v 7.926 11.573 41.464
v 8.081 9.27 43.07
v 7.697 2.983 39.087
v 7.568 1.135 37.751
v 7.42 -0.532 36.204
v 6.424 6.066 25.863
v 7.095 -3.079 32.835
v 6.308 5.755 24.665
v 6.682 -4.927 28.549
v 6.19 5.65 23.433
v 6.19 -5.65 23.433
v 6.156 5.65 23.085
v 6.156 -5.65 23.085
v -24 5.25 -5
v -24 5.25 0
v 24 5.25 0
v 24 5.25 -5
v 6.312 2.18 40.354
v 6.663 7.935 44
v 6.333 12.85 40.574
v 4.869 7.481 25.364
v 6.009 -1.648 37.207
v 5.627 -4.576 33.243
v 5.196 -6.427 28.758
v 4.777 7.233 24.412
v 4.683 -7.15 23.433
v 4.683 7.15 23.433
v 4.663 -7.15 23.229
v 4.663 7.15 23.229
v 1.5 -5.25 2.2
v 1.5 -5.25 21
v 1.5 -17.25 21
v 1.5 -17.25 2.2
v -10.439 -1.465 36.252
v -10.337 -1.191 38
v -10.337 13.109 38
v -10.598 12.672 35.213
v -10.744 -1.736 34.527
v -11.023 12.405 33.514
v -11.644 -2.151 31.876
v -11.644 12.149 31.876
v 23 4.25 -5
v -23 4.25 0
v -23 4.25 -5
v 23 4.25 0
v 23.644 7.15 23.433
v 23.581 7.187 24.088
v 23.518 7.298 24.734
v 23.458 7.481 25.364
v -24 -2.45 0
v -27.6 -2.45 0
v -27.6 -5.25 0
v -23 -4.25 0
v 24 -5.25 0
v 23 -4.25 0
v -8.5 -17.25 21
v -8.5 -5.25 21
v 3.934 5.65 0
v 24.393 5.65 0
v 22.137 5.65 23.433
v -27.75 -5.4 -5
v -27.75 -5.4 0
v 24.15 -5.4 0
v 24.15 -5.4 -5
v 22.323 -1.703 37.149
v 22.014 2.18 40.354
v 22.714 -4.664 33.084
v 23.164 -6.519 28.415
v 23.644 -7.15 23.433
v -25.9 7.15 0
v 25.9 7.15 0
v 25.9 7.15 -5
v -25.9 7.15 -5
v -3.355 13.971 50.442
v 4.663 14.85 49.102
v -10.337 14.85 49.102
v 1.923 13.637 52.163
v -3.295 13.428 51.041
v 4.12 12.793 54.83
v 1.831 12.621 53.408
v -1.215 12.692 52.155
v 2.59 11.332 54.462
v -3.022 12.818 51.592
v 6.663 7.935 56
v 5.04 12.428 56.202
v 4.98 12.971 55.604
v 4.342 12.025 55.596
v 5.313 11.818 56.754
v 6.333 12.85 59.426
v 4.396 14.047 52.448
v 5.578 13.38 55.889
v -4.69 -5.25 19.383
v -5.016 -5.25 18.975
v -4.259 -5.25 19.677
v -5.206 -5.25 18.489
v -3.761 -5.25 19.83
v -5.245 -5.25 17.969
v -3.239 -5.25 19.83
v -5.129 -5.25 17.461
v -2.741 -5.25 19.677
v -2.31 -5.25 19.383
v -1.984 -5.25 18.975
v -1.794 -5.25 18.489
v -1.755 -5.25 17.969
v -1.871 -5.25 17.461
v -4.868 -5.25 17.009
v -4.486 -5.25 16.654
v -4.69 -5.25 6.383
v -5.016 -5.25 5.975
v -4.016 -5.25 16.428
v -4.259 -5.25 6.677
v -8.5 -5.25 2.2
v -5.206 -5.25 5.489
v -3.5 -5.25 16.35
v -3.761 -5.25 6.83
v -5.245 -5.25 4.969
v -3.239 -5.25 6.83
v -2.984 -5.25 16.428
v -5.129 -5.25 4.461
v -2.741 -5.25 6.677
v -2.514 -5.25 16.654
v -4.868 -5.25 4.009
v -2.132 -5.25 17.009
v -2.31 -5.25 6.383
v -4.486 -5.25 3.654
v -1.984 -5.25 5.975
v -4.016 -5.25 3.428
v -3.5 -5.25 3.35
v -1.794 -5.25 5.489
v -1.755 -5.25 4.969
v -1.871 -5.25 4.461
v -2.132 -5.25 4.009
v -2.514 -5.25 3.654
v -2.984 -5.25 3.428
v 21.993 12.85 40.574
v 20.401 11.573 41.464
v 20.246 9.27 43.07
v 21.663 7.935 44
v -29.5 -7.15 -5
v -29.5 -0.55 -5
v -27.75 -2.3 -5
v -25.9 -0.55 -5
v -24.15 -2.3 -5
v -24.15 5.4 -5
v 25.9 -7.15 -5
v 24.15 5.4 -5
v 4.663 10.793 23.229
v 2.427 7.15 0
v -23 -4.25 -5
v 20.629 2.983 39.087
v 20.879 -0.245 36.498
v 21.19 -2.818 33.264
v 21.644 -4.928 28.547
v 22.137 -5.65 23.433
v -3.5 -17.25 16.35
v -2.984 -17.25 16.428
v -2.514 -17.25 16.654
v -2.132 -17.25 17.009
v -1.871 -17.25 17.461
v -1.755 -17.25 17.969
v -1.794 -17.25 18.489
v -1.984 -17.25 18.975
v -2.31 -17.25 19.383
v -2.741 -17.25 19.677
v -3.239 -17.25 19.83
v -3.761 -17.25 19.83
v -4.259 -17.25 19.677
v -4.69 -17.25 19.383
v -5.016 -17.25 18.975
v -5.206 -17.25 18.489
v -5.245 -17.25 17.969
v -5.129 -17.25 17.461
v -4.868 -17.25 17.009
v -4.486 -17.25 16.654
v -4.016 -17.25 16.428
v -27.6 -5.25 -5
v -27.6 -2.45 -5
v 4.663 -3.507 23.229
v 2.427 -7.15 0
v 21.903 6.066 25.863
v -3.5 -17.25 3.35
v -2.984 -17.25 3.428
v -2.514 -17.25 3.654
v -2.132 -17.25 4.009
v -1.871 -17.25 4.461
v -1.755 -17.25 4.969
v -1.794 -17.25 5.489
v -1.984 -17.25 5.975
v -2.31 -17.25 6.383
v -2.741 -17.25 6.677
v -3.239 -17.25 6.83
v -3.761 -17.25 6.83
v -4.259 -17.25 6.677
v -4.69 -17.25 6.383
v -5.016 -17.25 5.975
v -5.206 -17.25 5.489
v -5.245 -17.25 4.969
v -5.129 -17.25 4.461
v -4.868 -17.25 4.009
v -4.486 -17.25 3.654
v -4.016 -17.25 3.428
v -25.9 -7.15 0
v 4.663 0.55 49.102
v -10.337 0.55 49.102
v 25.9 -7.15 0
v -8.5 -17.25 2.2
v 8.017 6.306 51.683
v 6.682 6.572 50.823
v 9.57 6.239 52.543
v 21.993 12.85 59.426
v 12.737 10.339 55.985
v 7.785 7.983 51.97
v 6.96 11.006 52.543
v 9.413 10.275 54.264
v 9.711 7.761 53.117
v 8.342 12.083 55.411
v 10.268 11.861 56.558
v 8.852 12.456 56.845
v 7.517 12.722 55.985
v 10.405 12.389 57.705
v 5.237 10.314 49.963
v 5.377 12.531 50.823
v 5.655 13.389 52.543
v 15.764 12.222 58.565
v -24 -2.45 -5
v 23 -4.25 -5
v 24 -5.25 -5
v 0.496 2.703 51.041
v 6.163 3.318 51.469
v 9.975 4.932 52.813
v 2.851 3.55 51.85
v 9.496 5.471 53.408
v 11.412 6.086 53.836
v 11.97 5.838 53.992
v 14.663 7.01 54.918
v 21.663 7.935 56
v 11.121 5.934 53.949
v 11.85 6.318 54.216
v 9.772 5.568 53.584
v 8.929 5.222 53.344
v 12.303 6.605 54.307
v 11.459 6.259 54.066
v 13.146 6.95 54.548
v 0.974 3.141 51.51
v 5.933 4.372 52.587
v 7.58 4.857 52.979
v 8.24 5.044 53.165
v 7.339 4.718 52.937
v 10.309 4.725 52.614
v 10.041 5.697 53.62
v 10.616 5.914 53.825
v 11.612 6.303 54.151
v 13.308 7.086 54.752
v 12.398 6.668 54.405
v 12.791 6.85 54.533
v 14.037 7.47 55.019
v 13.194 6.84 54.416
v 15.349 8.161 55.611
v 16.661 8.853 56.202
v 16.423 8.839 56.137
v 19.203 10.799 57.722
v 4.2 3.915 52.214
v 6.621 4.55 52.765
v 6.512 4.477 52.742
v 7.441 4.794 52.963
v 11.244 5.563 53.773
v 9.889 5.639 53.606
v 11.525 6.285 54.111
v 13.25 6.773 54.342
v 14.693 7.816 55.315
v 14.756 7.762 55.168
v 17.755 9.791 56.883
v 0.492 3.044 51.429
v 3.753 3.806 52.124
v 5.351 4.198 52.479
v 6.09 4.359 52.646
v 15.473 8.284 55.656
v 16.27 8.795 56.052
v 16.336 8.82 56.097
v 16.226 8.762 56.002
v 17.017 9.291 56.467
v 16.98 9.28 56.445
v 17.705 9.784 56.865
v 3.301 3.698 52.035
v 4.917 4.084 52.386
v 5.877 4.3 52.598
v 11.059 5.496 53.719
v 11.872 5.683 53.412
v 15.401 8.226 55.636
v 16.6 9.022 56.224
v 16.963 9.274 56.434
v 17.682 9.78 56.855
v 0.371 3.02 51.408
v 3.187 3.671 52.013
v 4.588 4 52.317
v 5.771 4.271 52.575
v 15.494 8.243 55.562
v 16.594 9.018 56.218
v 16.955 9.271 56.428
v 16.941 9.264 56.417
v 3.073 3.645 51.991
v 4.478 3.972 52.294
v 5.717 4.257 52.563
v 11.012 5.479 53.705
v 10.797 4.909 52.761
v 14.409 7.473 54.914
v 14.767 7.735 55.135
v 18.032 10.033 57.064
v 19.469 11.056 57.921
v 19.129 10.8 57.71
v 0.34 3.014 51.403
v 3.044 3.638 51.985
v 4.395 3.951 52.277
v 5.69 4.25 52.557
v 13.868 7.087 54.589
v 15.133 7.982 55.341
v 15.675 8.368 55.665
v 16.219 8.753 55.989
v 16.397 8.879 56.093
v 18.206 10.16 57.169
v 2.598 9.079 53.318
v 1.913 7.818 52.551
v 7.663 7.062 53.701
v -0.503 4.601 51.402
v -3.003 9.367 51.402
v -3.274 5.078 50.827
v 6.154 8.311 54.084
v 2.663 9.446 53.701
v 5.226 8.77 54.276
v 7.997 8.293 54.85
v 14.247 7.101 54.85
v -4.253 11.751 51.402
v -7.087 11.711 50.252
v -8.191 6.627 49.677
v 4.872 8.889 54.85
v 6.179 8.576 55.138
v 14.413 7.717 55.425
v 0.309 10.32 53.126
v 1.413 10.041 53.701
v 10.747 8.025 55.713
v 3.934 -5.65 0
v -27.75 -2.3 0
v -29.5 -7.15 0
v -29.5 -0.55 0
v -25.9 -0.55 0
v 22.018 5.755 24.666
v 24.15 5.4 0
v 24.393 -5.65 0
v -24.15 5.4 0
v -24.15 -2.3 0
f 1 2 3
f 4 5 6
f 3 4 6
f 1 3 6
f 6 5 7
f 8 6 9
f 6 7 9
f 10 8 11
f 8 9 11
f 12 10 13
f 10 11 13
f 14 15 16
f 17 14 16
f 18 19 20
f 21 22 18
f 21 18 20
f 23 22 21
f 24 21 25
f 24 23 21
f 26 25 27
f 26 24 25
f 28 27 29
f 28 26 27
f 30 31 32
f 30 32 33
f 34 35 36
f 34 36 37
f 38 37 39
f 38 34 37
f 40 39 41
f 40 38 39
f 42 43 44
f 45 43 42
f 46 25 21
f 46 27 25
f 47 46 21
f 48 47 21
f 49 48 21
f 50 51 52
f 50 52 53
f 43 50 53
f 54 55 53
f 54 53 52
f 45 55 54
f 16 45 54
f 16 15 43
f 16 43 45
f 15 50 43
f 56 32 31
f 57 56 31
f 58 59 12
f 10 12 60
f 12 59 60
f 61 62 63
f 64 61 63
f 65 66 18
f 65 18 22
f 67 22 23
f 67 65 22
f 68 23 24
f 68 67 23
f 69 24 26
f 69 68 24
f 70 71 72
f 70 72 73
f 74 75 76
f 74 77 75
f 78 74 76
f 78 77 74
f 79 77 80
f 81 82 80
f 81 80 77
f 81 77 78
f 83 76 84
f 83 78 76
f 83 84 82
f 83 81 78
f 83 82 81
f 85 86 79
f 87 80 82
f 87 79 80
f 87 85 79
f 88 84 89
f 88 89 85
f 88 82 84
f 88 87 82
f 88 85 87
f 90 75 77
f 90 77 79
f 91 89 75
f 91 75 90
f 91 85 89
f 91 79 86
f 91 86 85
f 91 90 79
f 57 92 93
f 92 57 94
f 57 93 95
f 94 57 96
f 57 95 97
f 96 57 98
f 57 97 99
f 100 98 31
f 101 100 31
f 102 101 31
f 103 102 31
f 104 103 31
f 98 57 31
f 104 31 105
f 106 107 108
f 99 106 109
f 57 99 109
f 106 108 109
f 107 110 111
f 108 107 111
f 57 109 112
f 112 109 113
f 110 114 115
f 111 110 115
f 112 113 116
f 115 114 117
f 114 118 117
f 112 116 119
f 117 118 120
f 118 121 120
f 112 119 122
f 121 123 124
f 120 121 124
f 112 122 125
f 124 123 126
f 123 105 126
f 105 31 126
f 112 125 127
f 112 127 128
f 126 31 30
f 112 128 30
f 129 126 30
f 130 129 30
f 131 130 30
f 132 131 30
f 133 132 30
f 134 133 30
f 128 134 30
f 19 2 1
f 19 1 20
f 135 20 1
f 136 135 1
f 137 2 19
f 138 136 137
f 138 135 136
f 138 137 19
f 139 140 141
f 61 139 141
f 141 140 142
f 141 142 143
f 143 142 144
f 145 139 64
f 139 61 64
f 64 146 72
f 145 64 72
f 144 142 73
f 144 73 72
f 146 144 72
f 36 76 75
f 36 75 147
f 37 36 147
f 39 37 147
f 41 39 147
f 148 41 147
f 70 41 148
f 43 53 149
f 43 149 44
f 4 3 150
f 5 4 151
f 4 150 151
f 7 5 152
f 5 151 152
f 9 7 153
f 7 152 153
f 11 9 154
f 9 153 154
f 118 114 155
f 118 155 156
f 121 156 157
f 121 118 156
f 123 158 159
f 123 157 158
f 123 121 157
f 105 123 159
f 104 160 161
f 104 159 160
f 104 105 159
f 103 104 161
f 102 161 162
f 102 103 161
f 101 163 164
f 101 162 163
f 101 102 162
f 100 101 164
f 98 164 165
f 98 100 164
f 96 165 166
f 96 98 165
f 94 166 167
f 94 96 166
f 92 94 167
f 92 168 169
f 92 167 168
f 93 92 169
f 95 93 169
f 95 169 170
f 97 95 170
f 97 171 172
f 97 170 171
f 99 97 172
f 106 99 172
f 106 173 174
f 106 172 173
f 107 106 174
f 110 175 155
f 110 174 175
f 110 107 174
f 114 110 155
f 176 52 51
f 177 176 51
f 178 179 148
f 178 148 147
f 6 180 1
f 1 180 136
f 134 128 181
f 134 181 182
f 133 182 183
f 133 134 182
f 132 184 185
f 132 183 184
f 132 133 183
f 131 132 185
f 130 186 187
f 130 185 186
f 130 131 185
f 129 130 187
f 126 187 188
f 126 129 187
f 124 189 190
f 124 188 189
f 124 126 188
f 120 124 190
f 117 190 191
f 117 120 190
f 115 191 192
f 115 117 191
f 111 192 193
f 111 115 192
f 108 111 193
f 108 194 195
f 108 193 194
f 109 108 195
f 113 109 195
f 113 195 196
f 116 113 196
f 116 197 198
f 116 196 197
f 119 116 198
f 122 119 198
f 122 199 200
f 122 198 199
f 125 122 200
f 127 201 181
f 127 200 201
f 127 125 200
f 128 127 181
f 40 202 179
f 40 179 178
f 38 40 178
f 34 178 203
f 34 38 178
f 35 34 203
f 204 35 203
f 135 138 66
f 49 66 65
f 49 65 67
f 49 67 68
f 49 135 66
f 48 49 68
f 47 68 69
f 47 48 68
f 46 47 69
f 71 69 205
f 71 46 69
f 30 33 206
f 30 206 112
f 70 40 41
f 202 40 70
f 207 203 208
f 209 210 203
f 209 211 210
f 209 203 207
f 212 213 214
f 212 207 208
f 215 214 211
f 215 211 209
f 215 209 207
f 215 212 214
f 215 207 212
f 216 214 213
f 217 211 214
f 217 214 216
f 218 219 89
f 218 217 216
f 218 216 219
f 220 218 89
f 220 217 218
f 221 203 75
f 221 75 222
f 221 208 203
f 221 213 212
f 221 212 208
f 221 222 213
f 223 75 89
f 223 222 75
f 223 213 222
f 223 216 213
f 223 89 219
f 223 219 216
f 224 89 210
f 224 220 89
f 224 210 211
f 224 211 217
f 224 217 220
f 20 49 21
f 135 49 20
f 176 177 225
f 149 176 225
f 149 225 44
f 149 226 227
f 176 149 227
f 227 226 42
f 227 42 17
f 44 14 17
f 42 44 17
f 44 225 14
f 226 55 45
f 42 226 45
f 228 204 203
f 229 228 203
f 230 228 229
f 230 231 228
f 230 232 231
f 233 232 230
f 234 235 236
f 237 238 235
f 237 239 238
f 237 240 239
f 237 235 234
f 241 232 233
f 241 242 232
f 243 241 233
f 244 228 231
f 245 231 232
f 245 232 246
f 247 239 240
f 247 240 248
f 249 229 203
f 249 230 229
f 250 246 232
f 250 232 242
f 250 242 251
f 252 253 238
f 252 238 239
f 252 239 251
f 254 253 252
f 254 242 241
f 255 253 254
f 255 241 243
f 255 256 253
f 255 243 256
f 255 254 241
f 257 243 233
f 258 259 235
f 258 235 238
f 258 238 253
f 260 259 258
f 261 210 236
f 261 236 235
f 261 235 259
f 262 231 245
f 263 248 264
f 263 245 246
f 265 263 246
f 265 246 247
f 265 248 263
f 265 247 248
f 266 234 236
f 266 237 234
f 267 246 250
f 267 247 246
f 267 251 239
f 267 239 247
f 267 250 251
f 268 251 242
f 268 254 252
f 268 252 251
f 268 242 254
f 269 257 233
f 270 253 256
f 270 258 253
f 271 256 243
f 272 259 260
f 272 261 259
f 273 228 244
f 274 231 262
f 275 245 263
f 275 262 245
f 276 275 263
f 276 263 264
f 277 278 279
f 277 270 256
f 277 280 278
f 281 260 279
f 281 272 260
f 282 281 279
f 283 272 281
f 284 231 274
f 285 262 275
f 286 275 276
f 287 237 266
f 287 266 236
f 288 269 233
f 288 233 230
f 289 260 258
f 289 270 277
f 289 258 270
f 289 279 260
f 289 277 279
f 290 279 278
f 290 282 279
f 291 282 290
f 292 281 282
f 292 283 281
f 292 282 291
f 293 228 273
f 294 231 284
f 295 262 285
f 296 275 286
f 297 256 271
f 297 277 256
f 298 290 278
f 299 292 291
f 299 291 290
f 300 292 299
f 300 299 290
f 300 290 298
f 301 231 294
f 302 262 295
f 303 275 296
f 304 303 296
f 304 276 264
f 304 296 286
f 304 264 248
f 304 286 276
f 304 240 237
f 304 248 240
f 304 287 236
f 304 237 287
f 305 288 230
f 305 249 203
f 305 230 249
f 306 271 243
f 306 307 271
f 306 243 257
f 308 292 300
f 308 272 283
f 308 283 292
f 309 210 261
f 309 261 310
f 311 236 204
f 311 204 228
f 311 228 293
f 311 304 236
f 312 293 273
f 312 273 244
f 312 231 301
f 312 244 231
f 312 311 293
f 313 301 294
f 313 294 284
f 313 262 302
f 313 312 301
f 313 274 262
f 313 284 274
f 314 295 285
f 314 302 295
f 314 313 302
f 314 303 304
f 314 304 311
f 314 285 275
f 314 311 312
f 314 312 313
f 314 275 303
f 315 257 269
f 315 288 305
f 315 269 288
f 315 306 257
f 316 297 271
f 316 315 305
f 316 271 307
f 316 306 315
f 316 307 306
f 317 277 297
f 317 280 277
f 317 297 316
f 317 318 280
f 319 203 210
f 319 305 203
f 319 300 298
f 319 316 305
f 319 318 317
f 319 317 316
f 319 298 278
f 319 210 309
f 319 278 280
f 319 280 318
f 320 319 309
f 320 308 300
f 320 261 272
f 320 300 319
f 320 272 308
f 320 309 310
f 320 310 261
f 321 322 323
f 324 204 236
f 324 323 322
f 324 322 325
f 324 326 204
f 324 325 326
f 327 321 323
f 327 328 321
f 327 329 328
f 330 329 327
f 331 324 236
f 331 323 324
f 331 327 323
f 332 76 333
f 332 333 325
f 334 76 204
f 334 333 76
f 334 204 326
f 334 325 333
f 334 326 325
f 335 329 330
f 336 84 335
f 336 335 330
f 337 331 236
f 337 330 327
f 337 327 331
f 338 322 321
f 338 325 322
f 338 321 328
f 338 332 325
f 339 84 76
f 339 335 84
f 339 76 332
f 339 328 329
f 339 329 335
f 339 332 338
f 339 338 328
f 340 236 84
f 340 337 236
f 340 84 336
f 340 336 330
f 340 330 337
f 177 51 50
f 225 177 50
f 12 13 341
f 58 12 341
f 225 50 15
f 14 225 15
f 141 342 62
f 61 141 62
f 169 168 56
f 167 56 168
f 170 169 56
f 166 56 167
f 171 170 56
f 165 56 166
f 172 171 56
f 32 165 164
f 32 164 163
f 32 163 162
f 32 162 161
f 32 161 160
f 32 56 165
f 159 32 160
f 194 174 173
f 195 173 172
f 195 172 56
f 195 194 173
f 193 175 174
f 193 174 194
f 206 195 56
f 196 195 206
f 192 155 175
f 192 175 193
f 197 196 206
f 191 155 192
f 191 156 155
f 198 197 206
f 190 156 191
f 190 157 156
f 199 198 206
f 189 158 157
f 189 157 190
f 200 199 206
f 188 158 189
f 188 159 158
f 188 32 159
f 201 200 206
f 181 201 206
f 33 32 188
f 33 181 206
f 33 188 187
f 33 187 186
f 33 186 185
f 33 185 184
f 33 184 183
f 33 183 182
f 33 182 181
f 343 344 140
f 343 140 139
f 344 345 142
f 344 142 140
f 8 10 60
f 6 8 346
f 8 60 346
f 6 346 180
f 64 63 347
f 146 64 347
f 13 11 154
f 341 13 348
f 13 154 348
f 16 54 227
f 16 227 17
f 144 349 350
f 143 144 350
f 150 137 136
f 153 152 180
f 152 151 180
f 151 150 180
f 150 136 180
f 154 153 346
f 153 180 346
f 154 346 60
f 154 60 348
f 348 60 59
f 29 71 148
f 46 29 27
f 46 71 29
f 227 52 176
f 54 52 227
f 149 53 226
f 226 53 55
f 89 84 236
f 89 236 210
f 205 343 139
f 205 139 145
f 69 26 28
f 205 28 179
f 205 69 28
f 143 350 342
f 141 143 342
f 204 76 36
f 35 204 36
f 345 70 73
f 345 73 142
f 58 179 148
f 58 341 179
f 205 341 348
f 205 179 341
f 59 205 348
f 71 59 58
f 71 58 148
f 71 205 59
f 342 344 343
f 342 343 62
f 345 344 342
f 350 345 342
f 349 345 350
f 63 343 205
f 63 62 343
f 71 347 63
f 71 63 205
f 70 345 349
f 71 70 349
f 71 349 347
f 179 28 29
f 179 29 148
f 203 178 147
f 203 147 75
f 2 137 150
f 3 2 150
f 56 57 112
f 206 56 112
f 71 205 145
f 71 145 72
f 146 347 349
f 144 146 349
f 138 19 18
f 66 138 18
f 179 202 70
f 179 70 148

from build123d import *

# Parameters (mm, degrees)
SKETCH1_W                 = 48
SKETCH1_H                 = 10.5
SKETCH1_W_2               = 46
SKETCH1_H_2               = 8.5
EXTRUDE_THIN1_DEPTH       = 5
SKETCH5_W                 = 3.6
SKETCH5_H                 = 2.8
BOSS_EXTRUDE2_DEPTH       = 5
EXTRUDE_THIN2_DEPTH       = 5
BOSS_EXTRUDE12_START      = -3.5
SKETCH12_W                = 18.8
SKETCH12_H                = 12
BOSS_EXTRUDE12_DEPTH      = 5
CUT_EXTRUDE1_DEPTH        = 44.664745505
CUT_EXTRUDE1_DEPTH_BACK   = 44.664745505
SKETCH14_R                = 1.75
BOSS_EXTRUDE13_DEPTH      = 20
BOSS_EXTRUDE14_DEPTH      = 30
SHELL1_T                  = -1.5
BOSS_EXTRUDE15_DEPTH      = 22
BOSS_EXTRUDE16_DEPTH      = 10
BOSS_EXTRUDE16_DEPTH_BACK = 30


with BuildPart() as part:
    # Sketch1 → Extrude-Thin1 (new body)
    with BuildSketch(Plane.XY):
        Rectangle(SKETCH1_W, SKETCH1_H)
        Rectangle(SKETCH1_W_2, SKETCH1_H_2, mode=Mode.SUBTRACT)
    extrude(amount=-EXTRUDE_THIN1_DEPTH)

    # Sketch5 → Boss-Extrude2 (add)
    with BuildSketch(Plane.XY):
        with Locations((-25.8, -3.85)):
            Rectangle(SKETCH5_W, SKETCH5_H)
    extrude(amount=-BOSS_EXTRUDE2_DEPTH)


with BuildPart() as body_2:
    # Sketch6 → Extrude-Thin2 (new body)
    with BuildSketch(Plane.XY):
        Polygon((-25.9, 7.15), (-25.9, -0.55), (-29.5, -0.55), (-29.5, -7.15), (25.9, -7.15), (25.9, 7.15), align=None)
        Polygon((-24.15, 5.4), (-24.15, -2.3), (-27.75, -2.3), (-27.75, -5.4), (24.15, -5.4), (24.15, 5.4), align=None, mode=Mode.SUBTRACT)
    extrude(amount=-EXTRUDE_THIN2_DEPTH)


with BuildPart() as body_3:
    # Sketch12 → Boss-Extrude12 (new, symmetric)
    with BuildSketch(Plane(origin=(0, 0, 0), x_dir=(0, 0, -1), z_dir=(1, 0, 0)).offset(BOSS_EXTRUDE12_START)):
        with Locations((-11.6, -11.25)):
            Rectangle(SKETCH12_W, SKETCH12_H)
    extrude(amount=BOSS_EXTRUDE12_DEPTH, both=True)

    # Sketch14 → Cut-Extrude1 (cut, two sides: drawn at the far end of the back side and taken through both)
    with BuildSketch(Plane.XZ.offset(17.25).offset(-CUT_EXTRUDE1_DEPTH_BACK)):
        with Locations(Location((-3.5, 18.1, 0), (0, 0, 270))):
            Circle(SKETCH14_R)
        with Locations(Location((-3.5, 5.1, 0), (0, 0, 270))):
            Circle(SKETCH14_R)
    extrude(amount=CUT_EXTRUDE1_DEPTH + CUT_EXTRUDE1_DEPTH_BACK, mode=Mode.SUBTRACT)


with BuildPart() as body_4:
    # Sketch17 → Boss-Extrude13 (new body)
    with BuildSketch(Plane.XZ.offset(7.15)):
        Polygon((2.426563759, 0), (14.163281879, 0), (14.163281879, 44), (6.663281879, 44), (4.663281879, 23.22920584), align=None)
        Polygon((14.163281879, 0), (25.9, 0), (21.663281879, 44), (14.163281879, 44), align=None)
    extrude(amount=-BOSS_EXTRUDE13_DEPTH)


with BuildPart() as body_5:
    # Sketch18 → Boss-Extrude14 (new, along a direction that is not the sketch's normal)
    with BuildSketch(Plane(origin=(25.662072026, 0, 2.47097649), x_dir=(0.0958457525202189, 0, -0.9953961983671794), z_dir=(0.9953961983671794, 0, 0.0958457525202189))):
        with BuildLine():
            Line((2.48240499, -7.15), (2.48240499, 7.15))
            Line((2.48240499, 7.15), (-21.059394801, 7.15))
            ThreePointArc((-21.059394801, 7.15), (-22.043031658, 7.233288759), (-22.998659663, 7.480783408))
            Line((-22.998659663, 7.480783408), (-38.279640556, 12.85))
            Line((-38.279640556, 12.85), (-41.721099174, 7.935087734))
            Line((-41.721099174, 7.935087734), (-38.058045186, 2.180185533))
            ThreePointArc((-38.058045186, 2.180185533), (-30.754838022, -4.664112793), (-21.059394801, -7.15))
            Line((-21.059394801, -7.15), (2.48240499, -7.15))
        make_face()
    extrude(amount=-BOSS_EXTRUDE14_DEPTH, dir=(1, 0, 0))

    # Combine1: intersect body 4
    add(body_4.part, mode=Mode.INTERSECT)

    # Shell1
    shell1_openings = [body_5.faces().sort_by_distance(p)[0] for p in [
        (14.163281879, 10.410169392, 42.27490788),
        (14.163281879, 0, 0),
    ]]
    offset(amount=SHELL1_T, openings=shell1_openings, kind=Kind.INTERSECTION)


with BuildPart() as body_5_2:
    # Sketch17<3> → Boss-Extrude15 (new body)
    with BuildSketch(Plane.XZ.offset(7.15)):
        with BuildLine():
            Line((-25.9, 0), (2.426563759, 0))
            Line((2.426563759, 0), (4.663281879, 23.22920584))
            Line((4.663281879, 23.22920584), (4.663281879, 49.102343279))
            Line((4.663281879, 49.102343279), (-10.336718121, 49.102343279))
            Line((-10.336718121, 49.102343279), (-10.336718121, 38))
            ThreePointArc((-10.336718121, 38), (-10.667124787, 34.869020691), (-11.643788978, 31.875974241))
            Line((-11.643788978, 31.875974241), (-25.9, 0))
        make_face()
    extrude(amount=-BOSS_EXTRUDE15_DEPTH)


with BuildPart() as body_6:
    # Sketch19 → Boss-Extrude16 (new, two sides: drawn at the far end of the back side and taken through both)
    with BuildSketch(Plane(origin=(0, 0, 0), x_dir=(0, 0, -1), z_dir=(1, 0, 0)).offset(-BOSS_EXTRUDE16_DEPTH_BACK)):
        Polygon((0, -7.15), (-49.102343279, 0.55), (-49.102343279, 14.85), (0, 7.15), align=None)
    extrude(amount=BOSS_EXTRUDE16_DEPTH + BOSS_EXTRUDE16_DEPTH_BACK)


with BuildPart() as body_5_2_1:
    add(body_5_2.part)

    # Combine2: intersect body 6
    add(body_6.part, mode=Mode.INTERSECT)

    # Loft4: read off the stored shape, not the designer's step
    # Loft4: loft between two sections, ruled curve by curve
    loft4_from = [
        Edge.make_bspline([(-10.336718121, 14.85, 49.102343279), (-10.336718121, 12.466666667, 49.102343279), (-10.336718121, 10.083333333, 49.102343279), (-10.336718121, 5.316666667, 49.102343279), (-10.336718121, 2.933333333, 49.102343279), (-10.336718121, 0.55, 49.102343279)], [0, 0, 0, 0, 0.5, 0.5, 1, 1, 1, 1], 3),
        Edge.make_bspline([(-10.336718121, 0.55, 49.102343279), (-7.836718121, 0.55, 49.102343279), (-5.336718121, 0.55, 49.102343279), (-0.336718121, 0.55, 49.102343279), (2.163281879, 0.55, 49.102343279), (4.663281879, 0.55, 49.102343279)], [0, 0, 0, 0, 0.5, 0.5, 1, 1, 1, 1], 3),
        Edge.make_bspline([(4.663281879, 14.85, 49.102343279), (2.163281879, 14.85, 49.102343279), (-0.336718121, 14.85, 49.102343279), (-5.336718121, 14.85, 49.102343279), (-7.836718121, 14.85, 49.102343279), (-10.336718121, 14.85, 49.102343279)], [0, 0, 0, 0, 0.5, 0.5, 1, 1, 1, 1], 3),
        Edge.make_bspline([(4.663281879, 0.55, 49.102343279), (4.663281879, 2.933333333, 49.102343279), (4.663281879, 5.316666667, 49.102343279), (4.663281879, 10.083333333, 49.102343279), (4.663281879, 12.466666667, 49.102343279), (4.663281879, 14.85, 49.102343279)], [0, 0, 0, 0, 0.5, 0.5, 1, 1, 1, 1], 3),
    ]
    loft4_to = [
        Edge.make_bspline([(6.663281879, 7.935087734, 56), (9.163281879, 7.935087734, 56), (11.663281879, 7.935087734, 56), (16.663281879, 7.935087734, 56), (19.163281879, 7.935087734, 56), (21.663281879, 7.935087734, 56)], [0, 0, 0, 0, 0.5, 0.5, 1, 1, 1, 1], 3),
        Edge.make_bspline([(21.663281879, 7.935087734, 56), (21.718256744, 8.754239779, 56.570935804), (21.77323161, 9.573391823, 57.141871608), (21.88318134, 11.211695911, 58.283743217), (21.938156205, 12.030847956, 58.854679021), (21.99313107, 12.85, 59.425614825)], [0, 0, 0, 0, 0.5, 0.5, 1, 1, 1, 1], 3),
        Edge.make_bspline([(6.333432688, 12.85, 59.425614825), (6.388407553, 12.030847956, 58.854679021), (6.443382419, 11.211695911, 58.283743217), (6.553332149, 9.573391823, 57.141871608), (6.608307014, 8.754239779, 56.570935804), (6.663281879, 7.935087734, 56)], [0, 0, 0, 0, 0.5, 0.5, 1, 1, 1, 1], 3),
        Edge.make_bspline([(21.99313107, 12.85, 59.425614825), (19.38318134, 12.85, 59.425614825), (16.77323161, 12.85, 59.425614825), (11.553332149, 12.85, 59.425614825), (8.943382419, 12.85, 59.425614825), (6.333432688, 12.85, 59.425614825)], [0, 0, 0, 0, 0.5, 0.5, 1, 1, 1, 1], 3),
    ]
    loft4 = Solid(Shell([*[Face.make_surface_from_curves(loft4_from[k], loft4_to[k]) for k in range(4)], Face(Wire(loft4_from)), Face(Wire(loft4_to))]))
    add(loft4)


solid = Compound([part.part, body_2.part, body_3.part, body_5.part, body_5_2_1.part])
